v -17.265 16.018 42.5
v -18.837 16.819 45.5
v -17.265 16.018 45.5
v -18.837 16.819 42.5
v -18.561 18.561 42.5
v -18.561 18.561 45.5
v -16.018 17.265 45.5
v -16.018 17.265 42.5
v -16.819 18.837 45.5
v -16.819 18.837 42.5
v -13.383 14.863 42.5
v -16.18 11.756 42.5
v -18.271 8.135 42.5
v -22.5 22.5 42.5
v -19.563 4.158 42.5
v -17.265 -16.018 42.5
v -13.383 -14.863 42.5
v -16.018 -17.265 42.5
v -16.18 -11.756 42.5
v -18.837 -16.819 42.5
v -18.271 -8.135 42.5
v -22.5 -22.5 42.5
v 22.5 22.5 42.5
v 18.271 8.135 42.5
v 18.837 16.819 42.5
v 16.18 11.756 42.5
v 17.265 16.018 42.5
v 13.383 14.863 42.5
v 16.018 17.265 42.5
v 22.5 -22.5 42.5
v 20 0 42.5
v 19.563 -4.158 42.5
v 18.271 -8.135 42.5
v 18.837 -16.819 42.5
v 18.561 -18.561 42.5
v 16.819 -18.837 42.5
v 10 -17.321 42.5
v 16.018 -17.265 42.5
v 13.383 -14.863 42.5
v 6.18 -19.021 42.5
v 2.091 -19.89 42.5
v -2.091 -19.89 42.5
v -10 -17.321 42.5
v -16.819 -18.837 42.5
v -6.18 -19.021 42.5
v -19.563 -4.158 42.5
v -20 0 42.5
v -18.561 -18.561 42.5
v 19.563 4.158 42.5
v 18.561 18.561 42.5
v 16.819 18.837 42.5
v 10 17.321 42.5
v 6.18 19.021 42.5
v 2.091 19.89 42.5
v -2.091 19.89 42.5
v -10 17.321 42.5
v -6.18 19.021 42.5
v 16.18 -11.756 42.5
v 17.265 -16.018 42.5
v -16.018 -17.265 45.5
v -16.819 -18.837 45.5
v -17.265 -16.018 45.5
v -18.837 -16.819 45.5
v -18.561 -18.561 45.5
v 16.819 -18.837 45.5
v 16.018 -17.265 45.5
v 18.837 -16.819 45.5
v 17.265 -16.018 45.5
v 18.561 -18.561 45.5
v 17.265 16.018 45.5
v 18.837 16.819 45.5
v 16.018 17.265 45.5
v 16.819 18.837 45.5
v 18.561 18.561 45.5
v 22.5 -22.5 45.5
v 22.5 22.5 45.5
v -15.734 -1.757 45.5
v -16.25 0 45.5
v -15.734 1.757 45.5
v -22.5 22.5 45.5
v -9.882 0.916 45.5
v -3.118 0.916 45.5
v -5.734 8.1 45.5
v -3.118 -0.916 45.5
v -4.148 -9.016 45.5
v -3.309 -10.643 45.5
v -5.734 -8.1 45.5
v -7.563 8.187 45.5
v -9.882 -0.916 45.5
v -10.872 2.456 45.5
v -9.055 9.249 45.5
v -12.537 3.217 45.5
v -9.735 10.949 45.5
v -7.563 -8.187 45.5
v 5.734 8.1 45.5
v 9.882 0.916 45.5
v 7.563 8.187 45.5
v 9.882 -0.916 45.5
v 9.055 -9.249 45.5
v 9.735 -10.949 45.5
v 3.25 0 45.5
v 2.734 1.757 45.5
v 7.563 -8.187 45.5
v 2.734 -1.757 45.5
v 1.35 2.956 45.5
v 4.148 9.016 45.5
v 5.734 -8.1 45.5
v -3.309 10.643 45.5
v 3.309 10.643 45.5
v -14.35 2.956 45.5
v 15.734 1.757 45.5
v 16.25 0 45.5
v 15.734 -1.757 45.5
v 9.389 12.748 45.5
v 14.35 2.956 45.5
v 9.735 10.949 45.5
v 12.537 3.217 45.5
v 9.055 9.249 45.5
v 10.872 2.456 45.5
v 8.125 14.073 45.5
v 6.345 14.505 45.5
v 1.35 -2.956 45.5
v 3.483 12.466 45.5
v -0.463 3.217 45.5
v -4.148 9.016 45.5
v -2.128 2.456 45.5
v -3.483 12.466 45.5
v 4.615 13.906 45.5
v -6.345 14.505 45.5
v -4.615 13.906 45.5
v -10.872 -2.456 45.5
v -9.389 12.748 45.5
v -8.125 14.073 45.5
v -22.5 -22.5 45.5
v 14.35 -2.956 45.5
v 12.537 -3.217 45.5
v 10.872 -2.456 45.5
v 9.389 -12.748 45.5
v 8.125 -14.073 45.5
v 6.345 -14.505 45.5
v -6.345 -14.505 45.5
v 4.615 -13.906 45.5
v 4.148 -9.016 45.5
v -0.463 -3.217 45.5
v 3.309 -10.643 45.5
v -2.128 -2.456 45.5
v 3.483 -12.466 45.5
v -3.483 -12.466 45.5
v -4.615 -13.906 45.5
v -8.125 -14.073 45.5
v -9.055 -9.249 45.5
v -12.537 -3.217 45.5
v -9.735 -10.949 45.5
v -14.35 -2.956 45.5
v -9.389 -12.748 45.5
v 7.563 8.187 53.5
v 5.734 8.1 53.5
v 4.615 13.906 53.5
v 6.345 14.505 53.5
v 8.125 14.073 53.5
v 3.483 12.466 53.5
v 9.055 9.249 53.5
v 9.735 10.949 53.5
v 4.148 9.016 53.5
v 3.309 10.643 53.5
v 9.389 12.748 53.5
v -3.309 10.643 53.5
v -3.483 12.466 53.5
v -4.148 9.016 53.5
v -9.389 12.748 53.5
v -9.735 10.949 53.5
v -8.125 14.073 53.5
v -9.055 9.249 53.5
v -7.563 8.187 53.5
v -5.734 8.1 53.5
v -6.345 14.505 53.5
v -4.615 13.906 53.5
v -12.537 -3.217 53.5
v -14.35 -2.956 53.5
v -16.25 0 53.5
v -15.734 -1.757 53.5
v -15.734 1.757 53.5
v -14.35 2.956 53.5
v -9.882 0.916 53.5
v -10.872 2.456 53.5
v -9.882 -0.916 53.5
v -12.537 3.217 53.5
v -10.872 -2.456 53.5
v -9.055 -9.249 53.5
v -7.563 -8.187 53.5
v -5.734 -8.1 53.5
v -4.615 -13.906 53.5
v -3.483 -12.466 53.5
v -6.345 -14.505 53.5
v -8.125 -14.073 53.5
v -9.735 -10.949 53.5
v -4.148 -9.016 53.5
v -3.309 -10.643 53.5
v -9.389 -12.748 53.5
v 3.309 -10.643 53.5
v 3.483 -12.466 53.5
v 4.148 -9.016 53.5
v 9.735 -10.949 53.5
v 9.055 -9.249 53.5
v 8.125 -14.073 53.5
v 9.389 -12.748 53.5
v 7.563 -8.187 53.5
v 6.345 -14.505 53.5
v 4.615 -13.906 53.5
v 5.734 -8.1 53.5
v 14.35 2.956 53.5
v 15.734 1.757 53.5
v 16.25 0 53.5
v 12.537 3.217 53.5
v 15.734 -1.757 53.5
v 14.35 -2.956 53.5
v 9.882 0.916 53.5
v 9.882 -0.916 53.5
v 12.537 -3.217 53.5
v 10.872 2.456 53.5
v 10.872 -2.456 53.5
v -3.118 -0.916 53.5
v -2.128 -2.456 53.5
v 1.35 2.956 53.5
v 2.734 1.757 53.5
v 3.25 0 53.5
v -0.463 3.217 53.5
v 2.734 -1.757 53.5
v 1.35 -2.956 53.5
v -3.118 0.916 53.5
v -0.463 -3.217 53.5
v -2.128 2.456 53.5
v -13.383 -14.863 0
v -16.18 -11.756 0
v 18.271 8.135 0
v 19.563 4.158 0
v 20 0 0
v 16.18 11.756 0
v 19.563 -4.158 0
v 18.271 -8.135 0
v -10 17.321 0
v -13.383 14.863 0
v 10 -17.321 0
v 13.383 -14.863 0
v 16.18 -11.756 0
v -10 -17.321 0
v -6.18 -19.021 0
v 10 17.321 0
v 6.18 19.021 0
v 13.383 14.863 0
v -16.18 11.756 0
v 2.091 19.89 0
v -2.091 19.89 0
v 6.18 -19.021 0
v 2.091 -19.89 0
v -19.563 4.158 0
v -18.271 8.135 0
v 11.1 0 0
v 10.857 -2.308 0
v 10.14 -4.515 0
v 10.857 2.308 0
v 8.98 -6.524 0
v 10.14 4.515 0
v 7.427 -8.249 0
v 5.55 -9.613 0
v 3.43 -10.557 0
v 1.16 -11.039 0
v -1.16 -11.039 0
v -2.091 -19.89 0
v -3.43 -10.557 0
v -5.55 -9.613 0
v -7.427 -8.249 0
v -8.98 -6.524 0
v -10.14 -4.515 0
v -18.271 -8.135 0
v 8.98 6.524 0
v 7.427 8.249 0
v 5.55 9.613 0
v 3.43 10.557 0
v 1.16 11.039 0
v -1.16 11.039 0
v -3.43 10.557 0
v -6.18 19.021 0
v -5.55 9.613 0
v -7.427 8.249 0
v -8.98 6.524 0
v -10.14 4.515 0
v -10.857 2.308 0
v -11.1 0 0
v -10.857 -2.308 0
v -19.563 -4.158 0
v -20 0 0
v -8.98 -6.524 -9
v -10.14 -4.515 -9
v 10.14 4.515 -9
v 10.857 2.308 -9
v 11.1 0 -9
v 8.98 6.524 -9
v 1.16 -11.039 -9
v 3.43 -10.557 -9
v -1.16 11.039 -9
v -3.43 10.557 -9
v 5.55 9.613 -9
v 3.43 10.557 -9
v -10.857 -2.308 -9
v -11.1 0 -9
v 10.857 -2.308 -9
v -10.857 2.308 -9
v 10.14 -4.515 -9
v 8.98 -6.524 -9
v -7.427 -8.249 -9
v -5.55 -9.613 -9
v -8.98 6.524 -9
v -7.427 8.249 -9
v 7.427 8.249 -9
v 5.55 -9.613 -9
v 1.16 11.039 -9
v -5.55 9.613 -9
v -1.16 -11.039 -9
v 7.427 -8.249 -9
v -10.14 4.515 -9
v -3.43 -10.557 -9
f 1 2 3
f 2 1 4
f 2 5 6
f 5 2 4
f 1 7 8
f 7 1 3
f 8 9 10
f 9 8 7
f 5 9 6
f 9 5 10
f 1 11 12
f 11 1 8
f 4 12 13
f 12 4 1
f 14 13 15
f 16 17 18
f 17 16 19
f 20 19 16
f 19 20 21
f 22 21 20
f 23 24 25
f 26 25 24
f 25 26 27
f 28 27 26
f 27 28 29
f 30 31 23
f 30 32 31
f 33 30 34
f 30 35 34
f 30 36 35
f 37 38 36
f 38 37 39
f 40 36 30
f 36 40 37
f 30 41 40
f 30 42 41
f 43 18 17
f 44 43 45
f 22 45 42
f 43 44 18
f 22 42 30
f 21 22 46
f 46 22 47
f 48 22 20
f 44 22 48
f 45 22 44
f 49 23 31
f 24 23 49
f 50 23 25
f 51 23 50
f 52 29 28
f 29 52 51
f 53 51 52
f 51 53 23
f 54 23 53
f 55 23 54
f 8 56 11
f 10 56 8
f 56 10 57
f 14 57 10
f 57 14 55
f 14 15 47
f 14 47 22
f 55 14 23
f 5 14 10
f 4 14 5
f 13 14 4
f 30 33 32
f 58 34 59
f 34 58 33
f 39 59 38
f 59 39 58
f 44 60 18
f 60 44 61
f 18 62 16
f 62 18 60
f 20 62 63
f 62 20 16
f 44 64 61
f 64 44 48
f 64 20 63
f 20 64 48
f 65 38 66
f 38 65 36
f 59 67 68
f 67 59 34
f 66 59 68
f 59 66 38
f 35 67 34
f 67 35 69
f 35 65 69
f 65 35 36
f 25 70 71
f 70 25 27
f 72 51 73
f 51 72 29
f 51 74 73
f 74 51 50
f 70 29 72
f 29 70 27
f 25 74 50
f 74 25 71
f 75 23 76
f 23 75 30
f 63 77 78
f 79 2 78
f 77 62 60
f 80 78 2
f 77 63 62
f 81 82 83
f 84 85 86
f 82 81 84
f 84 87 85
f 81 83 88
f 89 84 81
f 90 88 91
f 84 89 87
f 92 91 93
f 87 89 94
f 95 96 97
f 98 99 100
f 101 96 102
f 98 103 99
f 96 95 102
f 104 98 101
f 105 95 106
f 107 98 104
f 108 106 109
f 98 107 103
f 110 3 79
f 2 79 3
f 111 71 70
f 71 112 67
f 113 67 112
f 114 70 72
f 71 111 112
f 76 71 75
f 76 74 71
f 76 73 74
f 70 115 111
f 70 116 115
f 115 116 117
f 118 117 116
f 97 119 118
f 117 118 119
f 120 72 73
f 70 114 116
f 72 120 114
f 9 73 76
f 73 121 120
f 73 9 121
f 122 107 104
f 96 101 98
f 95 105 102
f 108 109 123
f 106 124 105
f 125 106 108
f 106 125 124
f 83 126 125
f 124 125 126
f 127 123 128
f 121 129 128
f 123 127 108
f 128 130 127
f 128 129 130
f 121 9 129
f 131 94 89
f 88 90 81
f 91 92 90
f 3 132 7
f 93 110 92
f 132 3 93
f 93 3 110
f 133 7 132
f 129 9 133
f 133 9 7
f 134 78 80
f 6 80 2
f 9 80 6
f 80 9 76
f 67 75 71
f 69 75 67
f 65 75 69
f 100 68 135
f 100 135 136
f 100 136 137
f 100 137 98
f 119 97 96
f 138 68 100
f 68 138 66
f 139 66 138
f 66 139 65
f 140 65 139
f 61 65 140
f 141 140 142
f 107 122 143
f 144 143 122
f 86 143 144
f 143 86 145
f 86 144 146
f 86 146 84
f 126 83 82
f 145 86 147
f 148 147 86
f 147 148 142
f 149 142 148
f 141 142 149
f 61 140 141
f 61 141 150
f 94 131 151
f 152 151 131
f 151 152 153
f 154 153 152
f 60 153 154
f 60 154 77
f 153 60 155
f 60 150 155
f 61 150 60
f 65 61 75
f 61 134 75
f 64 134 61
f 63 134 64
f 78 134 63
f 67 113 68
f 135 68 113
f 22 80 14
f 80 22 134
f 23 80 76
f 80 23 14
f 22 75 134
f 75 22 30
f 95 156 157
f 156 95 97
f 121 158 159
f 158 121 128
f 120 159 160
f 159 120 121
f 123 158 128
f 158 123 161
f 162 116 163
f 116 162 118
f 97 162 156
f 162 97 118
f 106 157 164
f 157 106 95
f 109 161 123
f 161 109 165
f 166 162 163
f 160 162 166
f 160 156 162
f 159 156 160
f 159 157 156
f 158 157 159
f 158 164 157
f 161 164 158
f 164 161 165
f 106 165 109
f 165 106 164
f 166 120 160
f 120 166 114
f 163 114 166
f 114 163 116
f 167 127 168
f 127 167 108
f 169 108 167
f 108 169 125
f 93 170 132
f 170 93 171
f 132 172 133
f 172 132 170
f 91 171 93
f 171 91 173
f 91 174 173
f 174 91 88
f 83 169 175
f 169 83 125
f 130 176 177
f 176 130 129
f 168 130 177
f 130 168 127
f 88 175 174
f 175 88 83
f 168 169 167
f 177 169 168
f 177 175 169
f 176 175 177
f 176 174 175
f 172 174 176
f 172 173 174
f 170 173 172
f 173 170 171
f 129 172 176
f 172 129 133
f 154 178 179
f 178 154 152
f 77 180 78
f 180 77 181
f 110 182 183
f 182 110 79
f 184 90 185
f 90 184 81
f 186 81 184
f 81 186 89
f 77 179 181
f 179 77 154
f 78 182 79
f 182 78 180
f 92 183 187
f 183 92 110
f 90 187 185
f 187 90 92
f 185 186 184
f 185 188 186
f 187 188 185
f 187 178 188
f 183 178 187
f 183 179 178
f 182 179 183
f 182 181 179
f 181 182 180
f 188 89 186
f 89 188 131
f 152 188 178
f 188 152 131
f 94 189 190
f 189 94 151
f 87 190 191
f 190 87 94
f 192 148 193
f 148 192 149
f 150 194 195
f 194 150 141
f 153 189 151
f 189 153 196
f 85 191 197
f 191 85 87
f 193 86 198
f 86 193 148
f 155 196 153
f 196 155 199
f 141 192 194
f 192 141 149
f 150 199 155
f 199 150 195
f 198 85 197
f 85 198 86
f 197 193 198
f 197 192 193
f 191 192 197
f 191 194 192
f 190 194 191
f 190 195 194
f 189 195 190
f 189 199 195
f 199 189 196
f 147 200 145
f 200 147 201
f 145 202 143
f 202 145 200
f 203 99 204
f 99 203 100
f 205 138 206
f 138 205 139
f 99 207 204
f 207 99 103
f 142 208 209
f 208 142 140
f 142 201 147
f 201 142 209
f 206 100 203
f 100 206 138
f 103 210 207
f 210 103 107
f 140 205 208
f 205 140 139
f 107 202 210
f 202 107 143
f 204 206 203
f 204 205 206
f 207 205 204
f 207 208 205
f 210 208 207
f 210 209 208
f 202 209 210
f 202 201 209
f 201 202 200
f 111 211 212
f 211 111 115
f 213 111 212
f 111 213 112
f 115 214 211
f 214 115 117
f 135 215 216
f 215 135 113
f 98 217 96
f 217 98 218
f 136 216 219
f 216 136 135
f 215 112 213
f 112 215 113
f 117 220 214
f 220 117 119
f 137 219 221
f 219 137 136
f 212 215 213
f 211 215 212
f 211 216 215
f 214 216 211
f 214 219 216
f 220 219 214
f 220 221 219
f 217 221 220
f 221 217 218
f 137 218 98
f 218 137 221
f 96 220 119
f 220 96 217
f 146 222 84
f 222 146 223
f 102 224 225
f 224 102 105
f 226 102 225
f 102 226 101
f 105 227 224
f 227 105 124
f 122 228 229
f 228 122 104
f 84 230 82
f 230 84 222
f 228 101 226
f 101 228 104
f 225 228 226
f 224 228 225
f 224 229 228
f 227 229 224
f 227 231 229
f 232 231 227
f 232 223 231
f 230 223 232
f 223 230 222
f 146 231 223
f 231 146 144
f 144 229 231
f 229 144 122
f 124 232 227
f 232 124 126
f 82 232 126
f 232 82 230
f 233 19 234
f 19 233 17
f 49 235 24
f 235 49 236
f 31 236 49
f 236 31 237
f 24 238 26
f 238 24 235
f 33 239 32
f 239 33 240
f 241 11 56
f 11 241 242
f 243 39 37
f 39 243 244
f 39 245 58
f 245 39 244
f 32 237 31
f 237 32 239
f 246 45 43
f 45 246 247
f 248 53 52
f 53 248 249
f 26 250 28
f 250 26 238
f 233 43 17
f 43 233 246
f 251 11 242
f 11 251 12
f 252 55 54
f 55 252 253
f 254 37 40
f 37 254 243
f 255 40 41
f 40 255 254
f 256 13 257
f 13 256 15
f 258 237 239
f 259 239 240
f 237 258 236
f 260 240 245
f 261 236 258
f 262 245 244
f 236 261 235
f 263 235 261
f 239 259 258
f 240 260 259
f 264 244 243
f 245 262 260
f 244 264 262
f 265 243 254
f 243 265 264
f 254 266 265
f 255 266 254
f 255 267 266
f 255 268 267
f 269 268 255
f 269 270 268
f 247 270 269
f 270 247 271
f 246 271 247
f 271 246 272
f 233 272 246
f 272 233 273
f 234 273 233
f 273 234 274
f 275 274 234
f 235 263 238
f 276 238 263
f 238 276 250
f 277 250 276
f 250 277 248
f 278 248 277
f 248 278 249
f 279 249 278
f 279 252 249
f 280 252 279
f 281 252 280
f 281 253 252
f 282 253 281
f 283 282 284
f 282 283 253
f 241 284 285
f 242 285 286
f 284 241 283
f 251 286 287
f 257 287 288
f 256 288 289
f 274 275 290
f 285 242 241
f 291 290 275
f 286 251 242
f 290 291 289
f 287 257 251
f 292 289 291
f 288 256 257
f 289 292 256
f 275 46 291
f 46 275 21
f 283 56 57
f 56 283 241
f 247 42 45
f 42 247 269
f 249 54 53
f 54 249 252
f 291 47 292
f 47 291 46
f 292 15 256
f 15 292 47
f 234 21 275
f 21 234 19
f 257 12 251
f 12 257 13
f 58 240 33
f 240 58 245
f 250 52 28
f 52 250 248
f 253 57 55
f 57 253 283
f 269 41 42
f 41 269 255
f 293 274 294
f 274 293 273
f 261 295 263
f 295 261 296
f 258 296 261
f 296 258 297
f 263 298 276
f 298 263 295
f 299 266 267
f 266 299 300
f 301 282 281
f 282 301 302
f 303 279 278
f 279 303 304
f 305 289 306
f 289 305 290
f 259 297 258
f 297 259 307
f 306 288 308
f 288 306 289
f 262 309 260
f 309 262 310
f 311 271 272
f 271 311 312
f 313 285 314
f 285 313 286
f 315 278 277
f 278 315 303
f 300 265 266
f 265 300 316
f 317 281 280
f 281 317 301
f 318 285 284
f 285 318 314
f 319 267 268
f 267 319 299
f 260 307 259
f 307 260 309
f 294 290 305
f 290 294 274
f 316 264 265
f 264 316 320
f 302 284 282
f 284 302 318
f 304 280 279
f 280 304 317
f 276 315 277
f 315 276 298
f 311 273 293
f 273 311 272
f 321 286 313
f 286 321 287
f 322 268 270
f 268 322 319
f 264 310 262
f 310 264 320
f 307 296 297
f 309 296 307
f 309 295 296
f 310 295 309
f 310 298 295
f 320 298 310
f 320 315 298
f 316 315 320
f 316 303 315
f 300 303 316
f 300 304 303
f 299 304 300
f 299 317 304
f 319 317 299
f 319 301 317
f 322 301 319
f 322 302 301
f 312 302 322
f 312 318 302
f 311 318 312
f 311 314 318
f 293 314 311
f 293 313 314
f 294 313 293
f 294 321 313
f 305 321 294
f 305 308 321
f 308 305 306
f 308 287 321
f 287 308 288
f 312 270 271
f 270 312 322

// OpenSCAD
// file: util.scad
module centerCube(v){
    translate([-v[0]/2,-v[1]/2,0]) cube(v);
}

module nObj(r, n, offs){
    for(a=[1:n]) rotate([0,0, offs+a*360/n]) translate([r,0,0]) children();
}

module quad(d){
    nObj(sqrt(2)*d, 4, 45) children();
}

module quad2(x,y){
    translate([x,y,0]) children();
    translate([x,-y,0]) children();
    translate([-x,y,0]) children();
    translate([-x,-y,0]) children();
}

module zt(z){
    translate([0,0,z]) children();
}

module xt(x){
    translate([x,0,0]) children();
}

module yt(y){
    translate([0,y,0]) children();
}

module zr(z){
    rotate([0,0,z]) children();
}

module xr(x){
    rotate([x,0,0]) children();
}

module yr(y){
    rotate([0,y,0]) children();
}
// main file
use <util.scad>

module sp6tHolePattern(l=10){
translate([0,0,42.5+5-l])quad(35/2) cylinder(l, 3/2, 3/2);
}

module sp6tHolePattern(l=10){
translate([0,0,42.5+5-l])quad(35/2) cylinder(l, 3/2, 3/2);
}

module sp6t(){
    cylinder(42.5, 20, 20);
    translate([0,0,-9])
    cylinder(9, 11.1, 11.1);
    translate([0,0,42.5]){
        difference(){
        centerCube([45, 45,3]);
       translate([0,0,-42.5+5])sp6tHolePattern();
        }
        translate([0,0,3]){
            color([0,1,0])nObj(13, 6, 0) cylinder(8, 6.5/2, 6.5/2);
            cylinder(8, 6.5/2, 6.5/2);
        }
    }
}

sp6t();
